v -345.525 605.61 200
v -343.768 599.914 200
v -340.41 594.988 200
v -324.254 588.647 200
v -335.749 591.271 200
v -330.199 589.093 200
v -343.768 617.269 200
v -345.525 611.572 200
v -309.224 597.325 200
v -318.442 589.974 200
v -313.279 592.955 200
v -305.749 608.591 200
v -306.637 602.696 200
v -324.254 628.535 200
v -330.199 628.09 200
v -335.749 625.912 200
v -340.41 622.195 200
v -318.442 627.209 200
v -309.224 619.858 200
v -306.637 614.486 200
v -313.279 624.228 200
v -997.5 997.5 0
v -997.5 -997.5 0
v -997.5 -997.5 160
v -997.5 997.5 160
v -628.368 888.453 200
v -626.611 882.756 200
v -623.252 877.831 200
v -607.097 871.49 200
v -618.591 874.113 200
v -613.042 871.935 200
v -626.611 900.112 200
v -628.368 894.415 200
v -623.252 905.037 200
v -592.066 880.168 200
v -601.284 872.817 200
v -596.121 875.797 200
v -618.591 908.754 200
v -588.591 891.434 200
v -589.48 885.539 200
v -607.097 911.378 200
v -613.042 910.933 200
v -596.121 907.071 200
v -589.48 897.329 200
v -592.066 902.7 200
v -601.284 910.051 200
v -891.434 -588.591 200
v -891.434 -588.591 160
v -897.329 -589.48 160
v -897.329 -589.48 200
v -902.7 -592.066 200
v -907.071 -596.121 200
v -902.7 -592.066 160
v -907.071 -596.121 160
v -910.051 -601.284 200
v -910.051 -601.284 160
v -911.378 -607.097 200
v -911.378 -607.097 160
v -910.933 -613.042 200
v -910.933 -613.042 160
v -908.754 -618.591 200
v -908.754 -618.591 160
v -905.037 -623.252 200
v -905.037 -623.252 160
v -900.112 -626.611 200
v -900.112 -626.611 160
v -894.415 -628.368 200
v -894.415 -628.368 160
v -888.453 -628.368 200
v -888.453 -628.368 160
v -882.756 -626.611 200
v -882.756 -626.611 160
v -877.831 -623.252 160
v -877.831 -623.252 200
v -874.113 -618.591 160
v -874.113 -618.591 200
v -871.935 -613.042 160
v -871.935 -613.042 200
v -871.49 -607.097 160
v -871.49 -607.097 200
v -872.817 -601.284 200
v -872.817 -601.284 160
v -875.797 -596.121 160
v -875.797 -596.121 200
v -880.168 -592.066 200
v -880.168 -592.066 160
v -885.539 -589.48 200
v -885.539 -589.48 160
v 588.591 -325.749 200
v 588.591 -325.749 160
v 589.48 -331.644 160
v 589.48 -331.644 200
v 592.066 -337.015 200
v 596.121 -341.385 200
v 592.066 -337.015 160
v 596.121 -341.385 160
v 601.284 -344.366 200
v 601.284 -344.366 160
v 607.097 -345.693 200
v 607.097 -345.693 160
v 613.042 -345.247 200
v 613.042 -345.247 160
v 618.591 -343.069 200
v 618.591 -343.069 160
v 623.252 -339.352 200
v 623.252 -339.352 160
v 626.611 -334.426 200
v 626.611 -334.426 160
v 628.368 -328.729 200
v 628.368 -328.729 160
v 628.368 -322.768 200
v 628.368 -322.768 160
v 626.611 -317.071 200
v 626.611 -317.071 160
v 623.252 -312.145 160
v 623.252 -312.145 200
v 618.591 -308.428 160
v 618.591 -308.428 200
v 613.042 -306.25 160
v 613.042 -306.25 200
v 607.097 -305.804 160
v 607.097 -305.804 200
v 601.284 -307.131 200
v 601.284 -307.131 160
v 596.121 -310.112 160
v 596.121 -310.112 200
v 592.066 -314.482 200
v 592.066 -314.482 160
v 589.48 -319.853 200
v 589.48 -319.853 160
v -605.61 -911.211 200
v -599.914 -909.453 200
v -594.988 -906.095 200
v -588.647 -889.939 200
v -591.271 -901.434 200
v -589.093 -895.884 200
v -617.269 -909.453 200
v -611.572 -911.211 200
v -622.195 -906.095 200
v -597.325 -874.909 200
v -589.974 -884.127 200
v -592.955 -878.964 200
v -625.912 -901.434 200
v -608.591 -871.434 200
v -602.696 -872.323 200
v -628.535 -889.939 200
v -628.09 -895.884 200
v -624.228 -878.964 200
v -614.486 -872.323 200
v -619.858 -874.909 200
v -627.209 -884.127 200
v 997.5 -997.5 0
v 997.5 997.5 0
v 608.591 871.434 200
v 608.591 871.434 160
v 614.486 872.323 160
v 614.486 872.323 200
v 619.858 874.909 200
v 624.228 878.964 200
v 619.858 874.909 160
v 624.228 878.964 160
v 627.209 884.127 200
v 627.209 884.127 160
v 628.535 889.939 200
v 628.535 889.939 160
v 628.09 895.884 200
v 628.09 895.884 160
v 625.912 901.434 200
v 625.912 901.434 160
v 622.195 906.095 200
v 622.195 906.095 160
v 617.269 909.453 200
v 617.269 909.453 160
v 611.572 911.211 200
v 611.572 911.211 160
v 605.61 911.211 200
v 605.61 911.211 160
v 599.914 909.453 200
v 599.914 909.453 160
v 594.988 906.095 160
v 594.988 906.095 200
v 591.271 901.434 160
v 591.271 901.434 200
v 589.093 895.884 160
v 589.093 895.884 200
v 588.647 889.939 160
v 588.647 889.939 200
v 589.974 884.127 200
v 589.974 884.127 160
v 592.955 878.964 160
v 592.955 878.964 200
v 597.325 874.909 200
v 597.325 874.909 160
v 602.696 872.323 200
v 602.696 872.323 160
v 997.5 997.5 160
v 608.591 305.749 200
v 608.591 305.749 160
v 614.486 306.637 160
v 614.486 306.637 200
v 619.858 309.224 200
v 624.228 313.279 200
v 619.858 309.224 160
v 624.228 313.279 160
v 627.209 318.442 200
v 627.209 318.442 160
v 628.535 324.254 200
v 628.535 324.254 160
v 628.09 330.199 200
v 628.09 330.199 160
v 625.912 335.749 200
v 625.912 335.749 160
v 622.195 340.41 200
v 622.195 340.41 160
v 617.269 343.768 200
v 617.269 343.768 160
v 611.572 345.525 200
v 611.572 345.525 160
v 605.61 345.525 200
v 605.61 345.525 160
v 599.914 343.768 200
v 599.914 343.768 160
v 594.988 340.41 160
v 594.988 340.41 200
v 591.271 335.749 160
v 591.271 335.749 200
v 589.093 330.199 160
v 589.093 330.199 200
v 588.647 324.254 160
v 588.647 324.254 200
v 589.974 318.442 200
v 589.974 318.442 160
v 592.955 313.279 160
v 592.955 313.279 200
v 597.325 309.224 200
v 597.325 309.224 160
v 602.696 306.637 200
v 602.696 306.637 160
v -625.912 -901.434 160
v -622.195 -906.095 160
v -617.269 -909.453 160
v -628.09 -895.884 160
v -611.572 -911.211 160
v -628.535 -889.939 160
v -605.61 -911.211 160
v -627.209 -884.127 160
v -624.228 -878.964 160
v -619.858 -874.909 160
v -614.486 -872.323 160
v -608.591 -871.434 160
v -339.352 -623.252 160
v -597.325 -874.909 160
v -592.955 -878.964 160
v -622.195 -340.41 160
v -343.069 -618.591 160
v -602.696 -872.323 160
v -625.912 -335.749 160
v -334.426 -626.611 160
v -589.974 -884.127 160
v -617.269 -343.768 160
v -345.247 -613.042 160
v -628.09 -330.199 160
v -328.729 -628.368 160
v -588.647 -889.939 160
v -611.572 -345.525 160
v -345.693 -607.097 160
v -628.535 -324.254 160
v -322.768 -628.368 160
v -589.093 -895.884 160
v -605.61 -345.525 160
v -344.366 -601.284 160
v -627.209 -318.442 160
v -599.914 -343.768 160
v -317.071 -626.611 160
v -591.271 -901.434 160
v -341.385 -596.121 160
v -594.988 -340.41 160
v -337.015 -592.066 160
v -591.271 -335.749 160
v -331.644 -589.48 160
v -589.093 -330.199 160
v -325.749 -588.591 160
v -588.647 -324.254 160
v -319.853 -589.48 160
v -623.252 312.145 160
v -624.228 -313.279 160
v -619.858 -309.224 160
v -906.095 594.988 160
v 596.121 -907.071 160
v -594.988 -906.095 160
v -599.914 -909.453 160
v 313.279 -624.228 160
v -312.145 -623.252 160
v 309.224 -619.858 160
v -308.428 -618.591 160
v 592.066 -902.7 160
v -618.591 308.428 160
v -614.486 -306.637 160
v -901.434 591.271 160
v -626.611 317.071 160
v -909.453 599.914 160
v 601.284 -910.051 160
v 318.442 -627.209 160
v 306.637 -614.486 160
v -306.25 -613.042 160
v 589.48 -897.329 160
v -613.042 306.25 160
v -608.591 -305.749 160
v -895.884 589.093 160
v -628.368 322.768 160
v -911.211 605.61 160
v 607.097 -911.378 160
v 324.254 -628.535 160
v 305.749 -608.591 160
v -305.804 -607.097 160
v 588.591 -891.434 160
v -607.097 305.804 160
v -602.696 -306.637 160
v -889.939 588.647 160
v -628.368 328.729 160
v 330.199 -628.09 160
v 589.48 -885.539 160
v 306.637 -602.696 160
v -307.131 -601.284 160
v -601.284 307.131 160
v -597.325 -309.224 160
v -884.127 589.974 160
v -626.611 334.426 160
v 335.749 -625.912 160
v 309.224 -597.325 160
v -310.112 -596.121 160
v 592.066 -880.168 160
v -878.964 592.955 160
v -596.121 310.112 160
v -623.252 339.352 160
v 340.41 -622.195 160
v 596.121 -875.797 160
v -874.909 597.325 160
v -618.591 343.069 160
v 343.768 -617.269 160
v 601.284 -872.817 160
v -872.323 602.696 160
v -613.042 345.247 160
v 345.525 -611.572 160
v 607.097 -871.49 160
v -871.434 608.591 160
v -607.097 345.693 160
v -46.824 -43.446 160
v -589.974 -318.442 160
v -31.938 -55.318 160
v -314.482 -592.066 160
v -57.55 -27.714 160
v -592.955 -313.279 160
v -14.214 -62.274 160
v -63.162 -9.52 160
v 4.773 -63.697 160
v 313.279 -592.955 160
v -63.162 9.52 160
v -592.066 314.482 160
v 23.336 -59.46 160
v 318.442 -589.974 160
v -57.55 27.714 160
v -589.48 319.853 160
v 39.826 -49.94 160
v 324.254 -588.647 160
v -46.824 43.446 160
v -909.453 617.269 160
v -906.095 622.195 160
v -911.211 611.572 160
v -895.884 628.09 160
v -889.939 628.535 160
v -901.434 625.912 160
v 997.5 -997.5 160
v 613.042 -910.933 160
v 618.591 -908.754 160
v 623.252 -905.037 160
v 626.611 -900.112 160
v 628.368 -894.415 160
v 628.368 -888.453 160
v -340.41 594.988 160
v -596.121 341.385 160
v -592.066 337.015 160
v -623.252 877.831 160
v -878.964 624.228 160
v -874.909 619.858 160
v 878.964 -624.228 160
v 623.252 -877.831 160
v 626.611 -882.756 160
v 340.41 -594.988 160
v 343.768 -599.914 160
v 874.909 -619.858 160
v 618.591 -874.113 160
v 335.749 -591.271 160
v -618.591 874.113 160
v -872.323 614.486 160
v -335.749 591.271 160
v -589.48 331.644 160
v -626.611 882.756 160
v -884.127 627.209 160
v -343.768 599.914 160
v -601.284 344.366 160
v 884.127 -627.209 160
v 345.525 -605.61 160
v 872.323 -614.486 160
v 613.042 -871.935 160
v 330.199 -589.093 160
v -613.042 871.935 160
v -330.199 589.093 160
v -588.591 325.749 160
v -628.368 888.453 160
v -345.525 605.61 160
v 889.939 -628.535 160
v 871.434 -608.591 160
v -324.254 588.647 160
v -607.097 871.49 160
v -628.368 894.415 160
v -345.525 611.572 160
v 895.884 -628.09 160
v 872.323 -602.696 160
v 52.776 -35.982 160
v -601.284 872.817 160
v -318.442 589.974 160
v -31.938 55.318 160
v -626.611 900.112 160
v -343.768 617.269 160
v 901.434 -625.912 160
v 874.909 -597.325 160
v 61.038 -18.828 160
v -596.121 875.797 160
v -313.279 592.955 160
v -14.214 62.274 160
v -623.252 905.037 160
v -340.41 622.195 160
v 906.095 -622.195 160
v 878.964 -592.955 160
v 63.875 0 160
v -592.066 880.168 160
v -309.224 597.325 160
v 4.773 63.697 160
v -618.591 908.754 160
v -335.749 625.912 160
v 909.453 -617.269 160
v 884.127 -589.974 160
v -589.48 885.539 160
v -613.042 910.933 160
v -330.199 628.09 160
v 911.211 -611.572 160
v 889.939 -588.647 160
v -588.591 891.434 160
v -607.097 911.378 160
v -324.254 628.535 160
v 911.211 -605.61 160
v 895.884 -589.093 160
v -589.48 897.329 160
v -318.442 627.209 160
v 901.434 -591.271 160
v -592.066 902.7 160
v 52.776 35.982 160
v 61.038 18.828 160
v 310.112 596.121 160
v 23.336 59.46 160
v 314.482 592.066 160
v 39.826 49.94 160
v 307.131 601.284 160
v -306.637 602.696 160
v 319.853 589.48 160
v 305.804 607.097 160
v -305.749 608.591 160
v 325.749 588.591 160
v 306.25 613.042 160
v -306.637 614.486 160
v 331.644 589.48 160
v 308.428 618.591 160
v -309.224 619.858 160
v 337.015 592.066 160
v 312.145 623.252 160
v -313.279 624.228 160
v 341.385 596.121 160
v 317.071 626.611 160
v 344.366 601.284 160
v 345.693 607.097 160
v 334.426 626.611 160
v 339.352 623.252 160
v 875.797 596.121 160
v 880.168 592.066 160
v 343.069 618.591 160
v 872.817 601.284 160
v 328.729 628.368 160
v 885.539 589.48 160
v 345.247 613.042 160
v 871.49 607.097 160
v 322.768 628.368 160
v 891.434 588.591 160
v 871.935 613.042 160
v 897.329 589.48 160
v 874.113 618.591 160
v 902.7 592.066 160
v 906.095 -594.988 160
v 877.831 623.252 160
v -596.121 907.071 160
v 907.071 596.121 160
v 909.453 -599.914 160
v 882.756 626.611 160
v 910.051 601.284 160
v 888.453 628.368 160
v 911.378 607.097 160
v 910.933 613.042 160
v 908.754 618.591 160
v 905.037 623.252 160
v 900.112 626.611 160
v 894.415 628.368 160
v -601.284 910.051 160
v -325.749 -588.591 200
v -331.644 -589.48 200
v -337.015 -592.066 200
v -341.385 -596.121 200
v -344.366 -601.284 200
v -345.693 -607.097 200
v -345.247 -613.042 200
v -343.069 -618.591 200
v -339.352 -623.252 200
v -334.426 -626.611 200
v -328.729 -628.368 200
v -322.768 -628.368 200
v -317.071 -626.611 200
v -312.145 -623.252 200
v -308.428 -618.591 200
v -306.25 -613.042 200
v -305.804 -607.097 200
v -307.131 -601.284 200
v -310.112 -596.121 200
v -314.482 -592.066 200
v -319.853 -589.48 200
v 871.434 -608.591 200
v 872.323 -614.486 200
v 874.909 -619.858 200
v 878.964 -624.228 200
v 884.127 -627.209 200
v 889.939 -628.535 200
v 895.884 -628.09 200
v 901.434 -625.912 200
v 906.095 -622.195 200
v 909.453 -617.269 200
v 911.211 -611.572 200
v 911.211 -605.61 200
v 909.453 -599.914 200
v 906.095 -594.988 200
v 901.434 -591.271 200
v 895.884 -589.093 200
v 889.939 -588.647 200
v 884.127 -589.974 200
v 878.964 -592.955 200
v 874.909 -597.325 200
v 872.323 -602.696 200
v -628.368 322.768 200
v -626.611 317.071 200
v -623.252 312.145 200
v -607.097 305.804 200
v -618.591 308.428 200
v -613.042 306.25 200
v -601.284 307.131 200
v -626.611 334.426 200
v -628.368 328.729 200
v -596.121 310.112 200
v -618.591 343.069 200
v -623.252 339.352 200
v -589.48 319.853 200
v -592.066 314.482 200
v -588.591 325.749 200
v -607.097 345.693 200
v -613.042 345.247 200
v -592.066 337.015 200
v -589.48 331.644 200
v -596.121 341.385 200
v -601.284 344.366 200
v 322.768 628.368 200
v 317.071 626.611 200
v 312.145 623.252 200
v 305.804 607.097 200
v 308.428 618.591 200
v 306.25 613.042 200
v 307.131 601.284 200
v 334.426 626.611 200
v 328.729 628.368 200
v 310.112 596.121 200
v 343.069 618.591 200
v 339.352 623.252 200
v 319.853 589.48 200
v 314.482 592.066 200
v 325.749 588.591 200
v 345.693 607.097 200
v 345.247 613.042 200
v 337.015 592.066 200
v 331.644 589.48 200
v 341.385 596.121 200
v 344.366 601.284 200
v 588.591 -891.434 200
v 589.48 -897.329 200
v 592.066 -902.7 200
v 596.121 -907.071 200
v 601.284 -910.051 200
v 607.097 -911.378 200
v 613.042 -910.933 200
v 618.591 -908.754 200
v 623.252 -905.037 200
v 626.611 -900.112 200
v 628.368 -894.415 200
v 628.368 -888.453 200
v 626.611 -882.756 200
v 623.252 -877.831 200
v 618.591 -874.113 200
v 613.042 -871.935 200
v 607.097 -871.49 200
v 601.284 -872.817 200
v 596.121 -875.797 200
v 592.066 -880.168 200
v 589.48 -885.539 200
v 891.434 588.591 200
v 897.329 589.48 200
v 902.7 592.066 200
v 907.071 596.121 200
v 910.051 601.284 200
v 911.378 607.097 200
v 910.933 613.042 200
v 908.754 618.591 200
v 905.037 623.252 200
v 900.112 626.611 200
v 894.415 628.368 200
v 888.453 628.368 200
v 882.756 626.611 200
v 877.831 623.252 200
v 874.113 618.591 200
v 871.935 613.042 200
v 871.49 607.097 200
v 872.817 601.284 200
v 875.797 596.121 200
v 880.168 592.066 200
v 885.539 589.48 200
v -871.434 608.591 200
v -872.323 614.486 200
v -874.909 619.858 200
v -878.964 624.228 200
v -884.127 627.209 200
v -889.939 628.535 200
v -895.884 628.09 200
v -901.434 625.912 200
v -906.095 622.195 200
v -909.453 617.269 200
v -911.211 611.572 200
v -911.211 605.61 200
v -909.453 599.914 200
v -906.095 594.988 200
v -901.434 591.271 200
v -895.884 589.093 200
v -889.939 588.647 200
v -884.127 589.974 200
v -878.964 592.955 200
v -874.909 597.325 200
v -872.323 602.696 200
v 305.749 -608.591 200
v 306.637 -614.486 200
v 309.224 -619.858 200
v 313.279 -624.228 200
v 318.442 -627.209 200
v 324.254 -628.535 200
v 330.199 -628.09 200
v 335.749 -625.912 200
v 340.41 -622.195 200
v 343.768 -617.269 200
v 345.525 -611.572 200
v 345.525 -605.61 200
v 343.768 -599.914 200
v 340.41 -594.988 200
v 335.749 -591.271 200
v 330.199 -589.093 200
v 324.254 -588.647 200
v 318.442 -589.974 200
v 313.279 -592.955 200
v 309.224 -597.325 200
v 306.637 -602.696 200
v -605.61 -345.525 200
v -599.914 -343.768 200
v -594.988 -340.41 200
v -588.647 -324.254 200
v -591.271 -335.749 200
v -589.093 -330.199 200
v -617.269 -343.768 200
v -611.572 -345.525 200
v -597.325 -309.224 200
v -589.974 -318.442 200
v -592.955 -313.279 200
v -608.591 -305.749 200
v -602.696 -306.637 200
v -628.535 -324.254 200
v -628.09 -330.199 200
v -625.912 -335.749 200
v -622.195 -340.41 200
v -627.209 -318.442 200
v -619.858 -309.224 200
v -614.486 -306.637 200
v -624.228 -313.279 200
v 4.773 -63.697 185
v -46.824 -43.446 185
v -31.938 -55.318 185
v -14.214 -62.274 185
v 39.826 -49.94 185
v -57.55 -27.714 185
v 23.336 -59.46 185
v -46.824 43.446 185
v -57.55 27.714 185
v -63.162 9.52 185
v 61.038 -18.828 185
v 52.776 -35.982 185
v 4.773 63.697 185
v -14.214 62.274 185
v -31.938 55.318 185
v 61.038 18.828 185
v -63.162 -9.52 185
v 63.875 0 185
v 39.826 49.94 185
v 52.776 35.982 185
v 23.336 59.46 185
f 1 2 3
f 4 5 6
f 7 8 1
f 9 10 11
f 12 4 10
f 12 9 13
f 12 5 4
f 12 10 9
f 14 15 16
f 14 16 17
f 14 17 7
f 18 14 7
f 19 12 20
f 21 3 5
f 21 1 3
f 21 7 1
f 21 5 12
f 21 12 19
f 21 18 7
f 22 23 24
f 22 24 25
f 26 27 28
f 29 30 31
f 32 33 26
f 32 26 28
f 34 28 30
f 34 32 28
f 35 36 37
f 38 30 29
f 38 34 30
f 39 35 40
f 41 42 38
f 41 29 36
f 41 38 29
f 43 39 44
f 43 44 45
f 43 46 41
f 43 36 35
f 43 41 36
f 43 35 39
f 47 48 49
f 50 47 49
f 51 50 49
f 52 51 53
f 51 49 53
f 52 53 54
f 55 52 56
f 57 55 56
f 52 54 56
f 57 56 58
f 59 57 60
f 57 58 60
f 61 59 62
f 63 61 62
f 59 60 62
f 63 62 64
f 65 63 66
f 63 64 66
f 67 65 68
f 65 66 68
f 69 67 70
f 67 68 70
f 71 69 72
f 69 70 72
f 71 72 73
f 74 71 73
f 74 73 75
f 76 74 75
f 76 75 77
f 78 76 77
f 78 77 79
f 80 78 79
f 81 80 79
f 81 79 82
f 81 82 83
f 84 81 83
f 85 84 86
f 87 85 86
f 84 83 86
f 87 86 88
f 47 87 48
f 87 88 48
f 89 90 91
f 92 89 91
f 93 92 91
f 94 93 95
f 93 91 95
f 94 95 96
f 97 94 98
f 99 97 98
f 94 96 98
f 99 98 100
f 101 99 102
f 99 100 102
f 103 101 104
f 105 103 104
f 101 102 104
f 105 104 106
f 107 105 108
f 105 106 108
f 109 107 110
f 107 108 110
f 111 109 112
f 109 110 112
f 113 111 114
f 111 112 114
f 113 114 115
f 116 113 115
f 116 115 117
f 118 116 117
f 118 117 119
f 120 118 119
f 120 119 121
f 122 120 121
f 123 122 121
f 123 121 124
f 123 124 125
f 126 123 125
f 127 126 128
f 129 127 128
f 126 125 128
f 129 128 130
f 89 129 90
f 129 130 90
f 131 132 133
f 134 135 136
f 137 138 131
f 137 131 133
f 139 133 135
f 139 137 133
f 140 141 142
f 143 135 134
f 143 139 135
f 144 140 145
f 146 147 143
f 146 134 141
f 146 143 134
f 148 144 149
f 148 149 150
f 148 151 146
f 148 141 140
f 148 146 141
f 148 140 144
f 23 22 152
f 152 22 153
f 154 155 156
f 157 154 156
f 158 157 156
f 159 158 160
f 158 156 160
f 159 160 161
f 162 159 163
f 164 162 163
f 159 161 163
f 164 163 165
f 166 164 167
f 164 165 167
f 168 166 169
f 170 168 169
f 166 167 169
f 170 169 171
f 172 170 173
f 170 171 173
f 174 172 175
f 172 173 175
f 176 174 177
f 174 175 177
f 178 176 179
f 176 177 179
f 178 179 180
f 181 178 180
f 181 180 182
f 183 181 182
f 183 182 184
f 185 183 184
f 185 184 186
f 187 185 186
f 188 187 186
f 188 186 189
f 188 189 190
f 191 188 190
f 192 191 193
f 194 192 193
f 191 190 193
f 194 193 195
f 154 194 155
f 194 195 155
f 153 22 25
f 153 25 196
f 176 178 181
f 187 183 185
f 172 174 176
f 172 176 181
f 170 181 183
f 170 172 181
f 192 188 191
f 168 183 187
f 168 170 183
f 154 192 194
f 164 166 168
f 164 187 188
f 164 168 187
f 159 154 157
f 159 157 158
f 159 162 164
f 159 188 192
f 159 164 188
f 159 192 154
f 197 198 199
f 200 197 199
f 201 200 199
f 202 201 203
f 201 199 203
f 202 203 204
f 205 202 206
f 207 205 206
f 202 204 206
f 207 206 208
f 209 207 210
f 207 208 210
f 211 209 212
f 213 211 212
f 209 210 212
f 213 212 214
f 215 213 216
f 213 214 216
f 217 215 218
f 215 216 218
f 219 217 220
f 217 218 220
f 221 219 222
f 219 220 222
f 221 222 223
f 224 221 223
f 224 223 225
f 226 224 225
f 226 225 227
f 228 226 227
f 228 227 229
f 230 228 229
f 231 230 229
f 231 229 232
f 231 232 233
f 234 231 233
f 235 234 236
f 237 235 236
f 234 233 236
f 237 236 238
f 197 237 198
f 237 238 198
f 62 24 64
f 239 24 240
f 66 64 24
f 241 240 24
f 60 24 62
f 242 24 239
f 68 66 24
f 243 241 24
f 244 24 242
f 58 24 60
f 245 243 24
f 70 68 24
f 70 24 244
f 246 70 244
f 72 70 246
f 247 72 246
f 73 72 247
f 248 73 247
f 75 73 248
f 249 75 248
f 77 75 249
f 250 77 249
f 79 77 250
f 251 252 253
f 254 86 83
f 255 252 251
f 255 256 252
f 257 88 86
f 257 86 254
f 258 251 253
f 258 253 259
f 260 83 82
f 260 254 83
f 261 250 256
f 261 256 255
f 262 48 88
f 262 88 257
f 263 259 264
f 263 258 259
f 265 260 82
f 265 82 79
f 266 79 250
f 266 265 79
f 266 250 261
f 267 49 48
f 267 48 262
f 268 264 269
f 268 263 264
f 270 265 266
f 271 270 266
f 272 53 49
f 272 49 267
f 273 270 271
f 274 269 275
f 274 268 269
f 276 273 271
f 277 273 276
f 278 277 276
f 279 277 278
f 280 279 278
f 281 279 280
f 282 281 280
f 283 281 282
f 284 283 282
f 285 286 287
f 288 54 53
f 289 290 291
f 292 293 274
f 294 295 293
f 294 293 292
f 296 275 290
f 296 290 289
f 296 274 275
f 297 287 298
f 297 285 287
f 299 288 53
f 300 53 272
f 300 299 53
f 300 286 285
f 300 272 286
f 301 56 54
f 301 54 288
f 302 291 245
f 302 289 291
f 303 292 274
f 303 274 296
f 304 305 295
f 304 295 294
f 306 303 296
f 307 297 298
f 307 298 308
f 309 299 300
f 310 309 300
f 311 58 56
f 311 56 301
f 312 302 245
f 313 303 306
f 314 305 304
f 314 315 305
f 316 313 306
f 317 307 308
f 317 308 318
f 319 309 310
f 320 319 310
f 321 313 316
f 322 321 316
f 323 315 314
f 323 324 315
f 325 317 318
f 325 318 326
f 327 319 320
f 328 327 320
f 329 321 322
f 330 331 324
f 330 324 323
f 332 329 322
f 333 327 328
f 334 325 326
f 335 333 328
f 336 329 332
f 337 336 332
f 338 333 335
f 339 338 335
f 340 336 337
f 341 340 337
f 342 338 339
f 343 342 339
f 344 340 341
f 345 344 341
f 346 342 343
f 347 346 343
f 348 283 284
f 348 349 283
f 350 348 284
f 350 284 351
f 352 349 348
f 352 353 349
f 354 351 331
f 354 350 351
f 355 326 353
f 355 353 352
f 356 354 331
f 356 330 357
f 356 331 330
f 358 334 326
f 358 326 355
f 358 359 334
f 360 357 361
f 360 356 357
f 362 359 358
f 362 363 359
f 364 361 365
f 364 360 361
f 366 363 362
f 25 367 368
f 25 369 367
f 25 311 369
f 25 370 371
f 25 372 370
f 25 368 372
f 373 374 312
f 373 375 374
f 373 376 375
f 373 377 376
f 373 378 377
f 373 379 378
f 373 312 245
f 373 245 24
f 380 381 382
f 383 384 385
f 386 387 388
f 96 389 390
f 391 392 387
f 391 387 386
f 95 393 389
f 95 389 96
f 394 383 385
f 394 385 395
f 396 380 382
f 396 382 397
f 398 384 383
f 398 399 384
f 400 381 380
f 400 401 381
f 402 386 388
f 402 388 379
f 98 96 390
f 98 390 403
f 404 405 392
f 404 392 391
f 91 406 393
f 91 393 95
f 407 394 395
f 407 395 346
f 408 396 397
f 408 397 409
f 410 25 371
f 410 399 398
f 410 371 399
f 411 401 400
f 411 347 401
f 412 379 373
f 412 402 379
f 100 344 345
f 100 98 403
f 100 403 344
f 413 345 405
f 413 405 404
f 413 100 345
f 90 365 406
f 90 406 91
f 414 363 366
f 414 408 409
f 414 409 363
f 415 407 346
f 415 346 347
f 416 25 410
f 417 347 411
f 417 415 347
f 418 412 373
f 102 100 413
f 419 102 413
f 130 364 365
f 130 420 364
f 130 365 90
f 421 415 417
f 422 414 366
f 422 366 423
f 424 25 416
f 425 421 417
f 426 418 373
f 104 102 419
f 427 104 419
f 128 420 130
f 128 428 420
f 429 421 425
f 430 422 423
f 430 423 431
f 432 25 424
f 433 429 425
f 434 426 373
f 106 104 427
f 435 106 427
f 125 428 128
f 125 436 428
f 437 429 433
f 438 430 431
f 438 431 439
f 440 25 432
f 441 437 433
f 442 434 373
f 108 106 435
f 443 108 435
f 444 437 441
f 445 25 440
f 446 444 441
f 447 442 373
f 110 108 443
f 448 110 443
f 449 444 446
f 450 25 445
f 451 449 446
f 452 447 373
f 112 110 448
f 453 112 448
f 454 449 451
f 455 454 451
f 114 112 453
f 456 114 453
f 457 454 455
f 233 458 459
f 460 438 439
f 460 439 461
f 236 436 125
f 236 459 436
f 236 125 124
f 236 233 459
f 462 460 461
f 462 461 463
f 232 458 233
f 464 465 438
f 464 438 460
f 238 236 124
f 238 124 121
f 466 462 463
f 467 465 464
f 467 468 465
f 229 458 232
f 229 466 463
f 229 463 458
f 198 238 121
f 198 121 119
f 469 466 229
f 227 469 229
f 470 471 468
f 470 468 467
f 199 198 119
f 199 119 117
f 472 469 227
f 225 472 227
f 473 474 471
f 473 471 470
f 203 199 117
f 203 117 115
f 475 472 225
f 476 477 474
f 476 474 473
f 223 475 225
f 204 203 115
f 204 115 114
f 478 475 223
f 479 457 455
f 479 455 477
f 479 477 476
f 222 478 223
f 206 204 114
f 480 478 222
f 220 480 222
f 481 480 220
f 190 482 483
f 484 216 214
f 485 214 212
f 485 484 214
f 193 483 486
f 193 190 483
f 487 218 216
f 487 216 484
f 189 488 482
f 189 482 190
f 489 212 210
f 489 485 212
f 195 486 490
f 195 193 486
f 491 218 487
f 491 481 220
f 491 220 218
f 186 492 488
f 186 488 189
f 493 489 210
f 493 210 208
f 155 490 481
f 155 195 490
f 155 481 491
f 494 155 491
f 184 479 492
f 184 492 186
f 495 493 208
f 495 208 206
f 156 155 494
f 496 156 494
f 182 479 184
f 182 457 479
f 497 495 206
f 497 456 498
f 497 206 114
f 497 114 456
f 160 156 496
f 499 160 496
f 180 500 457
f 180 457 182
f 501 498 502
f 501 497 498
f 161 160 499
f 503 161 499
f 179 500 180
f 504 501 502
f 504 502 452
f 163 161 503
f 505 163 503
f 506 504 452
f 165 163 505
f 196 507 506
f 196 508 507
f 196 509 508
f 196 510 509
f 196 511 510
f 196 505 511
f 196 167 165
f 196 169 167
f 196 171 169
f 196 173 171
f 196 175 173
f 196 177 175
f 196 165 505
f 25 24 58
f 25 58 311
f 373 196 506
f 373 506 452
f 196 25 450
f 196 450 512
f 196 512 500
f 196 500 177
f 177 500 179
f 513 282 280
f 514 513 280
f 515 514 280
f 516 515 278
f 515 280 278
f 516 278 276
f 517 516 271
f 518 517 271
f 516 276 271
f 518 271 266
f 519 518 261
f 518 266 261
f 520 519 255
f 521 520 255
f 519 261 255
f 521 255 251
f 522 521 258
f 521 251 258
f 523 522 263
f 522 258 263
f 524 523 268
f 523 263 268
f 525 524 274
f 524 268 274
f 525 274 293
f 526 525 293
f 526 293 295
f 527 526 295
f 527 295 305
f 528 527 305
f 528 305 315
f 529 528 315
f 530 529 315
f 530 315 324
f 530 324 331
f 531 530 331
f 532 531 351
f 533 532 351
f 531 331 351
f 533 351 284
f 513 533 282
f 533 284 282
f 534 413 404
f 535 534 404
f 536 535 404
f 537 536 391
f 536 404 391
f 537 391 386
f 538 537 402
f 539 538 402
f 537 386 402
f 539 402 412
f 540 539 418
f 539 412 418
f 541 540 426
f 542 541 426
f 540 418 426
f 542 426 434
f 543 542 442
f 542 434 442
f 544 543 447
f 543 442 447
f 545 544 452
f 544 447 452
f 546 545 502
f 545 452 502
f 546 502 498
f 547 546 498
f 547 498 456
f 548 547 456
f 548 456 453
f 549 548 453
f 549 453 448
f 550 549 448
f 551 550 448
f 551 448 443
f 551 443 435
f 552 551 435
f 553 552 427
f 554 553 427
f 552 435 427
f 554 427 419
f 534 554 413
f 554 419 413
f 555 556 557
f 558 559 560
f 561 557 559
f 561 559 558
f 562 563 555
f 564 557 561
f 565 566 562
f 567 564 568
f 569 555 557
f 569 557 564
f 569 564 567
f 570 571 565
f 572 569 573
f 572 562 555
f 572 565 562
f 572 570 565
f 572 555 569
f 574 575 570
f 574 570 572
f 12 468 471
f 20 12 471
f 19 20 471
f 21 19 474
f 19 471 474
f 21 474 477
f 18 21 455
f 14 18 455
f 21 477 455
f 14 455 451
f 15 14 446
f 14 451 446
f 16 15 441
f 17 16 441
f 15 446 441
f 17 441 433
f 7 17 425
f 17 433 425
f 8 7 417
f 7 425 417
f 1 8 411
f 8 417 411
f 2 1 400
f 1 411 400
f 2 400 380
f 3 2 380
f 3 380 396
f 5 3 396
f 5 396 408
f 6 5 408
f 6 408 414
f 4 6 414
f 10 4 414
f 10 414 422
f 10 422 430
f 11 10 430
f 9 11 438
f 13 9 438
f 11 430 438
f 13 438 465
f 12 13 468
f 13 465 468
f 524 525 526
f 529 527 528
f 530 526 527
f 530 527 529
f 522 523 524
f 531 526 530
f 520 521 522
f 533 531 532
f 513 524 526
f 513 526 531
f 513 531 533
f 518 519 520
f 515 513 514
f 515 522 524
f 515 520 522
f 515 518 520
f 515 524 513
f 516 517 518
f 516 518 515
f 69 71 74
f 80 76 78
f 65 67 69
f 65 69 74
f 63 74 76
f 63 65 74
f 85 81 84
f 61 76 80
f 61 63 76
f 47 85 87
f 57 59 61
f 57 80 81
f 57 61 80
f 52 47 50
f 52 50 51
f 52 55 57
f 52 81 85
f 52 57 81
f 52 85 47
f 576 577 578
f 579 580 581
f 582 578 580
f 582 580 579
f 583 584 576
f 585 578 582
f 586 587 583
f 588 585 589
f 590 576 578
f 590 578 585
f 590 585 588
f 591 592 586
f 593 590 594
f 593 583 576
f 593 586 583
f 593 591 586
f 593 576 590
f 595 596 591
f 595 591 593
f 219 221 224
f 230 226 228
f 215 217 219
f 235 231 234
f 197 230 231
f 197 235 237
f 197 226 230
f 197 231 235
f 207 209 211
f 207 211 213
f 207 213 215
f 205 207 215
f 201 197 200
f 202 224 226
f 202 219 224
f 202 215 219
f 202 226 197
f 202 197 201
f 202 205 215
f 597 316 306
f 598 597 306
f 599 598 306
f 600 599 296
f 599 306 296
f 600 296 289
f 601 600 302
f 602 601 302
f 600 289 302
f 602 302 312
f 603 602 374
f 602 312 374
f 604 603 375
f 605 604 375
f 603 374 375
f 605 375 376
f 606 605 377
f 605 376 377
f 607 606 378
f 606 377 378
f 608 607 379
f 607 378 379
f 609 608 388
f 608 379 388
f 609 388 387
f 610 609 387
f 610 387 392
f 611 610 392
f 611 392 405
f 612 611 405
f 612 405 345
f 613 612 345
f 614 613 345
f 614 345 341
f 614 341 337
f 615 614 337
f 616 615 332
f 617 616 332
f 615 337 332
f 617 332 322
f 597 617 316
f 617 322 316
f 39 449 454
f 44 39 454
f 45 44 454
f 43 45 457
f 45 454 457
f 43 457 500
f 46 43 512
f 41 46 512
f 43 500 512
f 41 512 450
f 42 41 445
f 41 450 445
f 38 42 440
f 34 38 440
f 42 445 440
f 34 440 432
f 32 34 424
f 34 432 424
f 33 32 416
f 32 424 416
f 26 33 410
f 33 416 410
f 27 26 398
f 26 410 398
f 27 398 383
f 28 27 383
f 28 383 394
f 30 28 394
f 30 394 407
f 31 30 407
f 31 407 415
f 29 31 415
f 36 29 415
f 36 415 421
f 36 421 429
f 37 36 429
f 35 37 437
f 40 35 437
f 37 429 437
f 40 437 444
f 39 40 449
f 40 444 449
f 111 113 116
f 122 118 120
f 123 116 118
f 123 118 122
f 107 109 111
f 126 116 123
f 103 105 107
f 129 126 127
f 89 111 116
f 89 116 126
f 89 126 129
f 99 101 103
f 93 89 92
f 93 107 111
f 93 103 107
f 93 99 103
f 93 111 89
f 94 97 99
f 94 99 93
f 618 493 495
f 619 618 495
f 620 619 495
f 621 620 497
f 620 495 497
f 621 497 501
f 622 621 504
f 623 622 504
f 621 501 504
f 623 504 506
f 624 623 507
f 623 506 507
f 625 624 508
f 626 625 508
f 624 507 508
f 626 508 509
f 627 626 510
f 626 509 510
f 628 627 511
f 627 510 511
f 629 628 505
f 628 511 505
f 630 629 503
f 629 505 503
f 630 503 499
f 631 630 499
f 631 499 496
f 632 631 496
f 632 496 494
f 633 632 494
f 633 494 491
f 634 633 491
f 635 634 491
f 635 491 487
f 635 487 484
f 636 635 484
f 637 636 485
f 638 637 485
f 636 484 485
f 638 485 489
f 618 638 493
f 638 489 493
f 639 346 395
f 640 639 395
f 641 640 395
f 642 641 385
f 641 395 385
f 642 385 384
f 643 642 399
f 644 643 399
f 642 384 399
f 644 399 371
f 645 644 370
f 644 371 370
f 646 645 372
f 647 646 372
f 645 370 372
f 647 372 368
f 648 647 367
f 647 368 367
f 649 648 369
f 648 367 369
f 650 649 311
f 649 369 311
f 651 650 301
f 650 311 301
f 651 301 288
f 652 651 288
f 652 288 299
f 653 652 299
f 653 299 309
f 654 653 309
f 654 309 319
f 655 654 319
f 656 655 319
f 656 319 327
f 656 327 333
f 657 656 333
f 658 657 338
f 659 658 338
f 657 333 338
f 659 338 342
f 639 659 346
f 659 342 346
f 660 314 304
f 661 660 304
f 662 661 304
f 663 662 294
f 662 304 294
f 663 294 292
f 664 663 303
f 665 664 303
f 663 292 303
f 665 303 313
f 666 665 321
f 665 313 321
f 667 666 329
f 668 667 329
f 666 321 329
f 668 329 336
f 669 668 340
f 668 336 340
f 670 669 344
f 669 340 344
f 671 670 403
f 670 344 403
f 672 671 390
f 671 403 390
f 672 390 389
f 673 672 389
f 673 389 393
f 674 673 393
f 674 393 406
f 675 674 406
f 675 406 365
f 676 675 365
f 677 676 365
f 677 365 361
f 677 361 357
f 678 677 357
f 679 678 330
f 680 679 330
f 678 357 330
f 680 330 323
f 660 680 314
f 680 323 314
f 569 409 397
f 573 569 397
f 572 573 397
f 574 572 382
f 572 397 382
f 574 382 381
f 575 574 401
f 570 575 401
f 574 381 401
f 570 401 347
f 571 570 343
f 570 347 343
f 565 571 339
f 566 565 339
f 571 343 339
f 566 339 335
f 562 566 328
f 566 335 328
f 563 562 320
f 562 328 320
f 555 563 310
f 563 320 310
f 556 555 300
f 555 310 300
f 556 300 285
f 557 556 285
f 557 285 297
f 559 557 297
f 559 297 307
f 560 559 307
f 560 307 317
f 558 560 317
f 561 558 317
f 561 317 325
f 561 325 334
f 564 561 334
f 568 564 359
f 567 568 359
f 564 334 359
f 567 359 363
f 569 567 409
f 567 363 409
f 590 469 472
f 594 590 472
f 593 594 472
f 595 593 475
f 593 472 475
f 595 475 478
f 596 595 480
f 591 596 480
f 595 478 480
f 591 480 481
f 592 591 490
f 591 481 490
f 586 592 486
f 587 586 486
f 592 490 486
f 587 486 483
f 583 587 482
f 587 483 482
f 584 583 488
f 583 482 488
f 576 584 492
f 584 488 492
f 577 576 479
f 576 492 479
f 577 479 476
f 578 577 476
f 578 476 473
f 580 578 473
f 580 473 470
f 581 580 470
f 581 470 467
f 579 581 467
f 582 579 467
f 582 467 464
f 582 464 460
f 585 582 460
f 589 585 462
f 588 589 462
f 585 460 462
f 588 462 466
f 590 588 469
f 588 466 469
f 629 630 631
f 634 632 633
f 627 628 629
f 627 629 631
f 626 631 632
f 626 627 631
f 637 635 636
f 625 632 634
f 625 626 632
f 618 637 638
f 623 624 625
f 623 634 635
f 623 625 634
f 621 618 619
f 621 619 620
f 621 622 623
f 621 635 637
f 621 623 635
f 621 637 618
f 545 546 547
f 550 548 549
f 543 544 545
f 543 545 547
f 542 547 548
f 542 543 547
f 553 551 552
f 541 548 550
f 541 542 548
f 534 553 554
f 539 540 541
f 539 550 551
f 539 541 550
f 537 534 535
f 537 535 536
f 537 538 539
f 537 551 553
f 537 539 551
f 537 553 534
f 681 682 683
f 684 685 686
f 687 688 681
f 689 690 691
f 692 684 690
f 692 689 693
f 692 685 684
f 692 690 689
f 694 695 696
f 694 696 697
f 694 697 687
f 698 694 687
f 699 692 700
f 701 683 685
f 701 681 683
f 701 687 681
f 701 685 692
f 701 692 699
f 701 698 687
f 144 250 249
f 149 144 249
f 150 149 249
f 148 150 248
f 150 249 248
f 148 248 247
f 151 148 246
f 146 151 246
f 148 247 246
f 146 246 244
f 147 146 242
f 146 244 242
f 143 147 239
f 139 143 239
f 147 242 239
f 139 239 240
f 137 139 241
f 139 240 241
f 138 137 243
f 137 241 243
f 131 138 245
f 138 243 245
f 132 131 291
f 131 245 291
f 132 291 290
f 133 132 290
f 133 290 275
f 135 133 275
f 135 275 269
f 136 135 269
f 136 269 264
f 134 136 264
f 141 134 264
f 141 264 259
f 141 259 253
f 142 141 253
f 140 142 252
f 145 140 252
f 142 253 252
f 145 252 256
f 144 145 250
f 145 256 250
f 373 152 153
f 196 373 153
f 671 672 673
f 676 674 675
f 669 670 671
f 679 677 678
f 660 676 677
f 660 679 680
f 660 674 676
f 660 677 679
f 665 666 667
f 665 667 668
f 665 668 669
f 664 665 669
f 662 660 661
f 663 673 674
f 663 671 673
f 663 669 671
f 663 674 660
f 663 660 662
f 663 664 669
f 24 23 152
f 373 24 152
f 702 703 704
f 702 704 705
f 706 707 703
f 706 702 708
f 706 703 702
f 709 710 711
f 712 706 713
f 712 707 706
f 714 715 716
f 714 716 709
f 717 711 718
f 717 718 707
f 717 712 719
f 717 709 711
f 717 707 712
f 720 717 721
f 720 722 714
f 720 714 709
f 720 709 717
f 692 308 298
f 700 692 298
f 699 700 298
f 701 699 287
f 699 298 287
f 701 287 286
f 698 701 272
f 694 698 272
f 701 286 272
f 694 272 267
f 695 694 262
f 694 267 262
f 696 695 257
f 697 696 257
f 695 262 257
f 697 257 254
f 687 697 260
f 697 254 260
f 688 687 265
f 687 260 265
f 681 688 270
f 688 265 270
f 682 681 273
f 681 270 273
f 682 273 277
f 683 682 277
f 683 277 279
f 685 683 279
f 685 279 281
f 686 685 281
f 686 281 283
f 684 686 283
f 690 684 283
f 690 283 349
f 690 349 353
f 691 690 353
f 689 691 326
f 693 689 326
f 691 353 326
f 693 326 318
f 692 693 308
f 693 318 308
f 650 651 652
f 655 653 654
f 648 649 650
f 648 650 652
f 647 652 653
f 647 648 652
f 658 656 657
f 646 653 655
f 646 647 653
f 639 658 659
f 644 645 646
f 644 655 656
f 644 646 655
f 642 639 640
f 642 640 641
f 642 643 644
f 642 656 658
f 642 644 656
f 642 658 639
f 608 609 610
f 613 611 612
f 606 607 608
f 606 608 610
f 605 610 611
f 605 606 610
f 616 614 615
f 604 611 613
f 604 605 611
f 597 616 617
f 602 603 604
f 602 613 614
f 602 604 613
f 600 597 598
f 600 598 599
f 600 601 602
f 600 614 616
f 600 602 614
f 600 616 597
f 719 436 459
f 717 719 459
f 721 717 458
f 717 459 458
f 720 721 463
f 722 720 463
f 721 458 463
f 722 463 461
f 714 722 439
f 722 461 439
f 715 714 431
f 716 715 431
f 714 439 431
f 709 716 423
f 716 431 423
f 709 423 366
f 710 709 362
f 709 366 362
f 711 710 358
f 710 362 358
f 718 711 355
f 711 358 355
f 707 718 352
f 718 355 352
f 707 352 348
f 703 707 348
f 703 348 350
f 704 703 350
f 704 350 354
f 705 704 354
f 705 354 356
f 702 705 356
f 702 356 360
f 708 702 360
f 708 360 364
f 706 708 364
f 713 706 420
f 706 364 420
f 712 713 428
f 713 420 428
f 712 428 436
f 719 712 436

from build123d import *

# Parameters (mm, degrees)
F0_W            = 1995
F0_H            = 1995
F1_DEPTH        = 160
F2_R            = 20
F3_DEPTH        = 40
F3_COPIES_COUNT = 4
F4_R            = 63.875346373
F5_DEPTH        = 25


# Not quite as in the source:
# - a pattern or mirror of a feature is missing from the dataset's text; its kind, count and spacing are read off the source's solid


with BuildPart() as f1:
    # F0 (on Top) → F1 (new body)
    with BuildSketch(Plane.XY):
        Rectangle(F0_W, F0_H)
    extrude(amount=F1_DEPTH)

    # F2 (on face) → F3 (join)
    with BuildSketch(Plane.XY.offset(160)):
        with Locations((-608.5912703474, 891.433982822)):
            Circle(F2_R)
        with Locations((-325.7485578728, 608.5912703474)):
            Circle(F2_R)
        with Locations((-608.5912703474, 325.7485578728)):
            Circle(F2_R)
        with Locations((-891.433982822, 608.5912703474)):
            Circle(F2_R)
    f3 = extrude(amount=F3_DEPTH)

    # F3_copies: F3 ×4 about axis
    f3_copies_axis = Axis((0, 0, 0), (0, 0, 1))
    for i in range(1, F3_COPIES_COUNT):
        add(f3.rotate(f3_copies_axis, i * 360 / F3_COPIES_COUNT))

    # F4 (on face) → F5 (join)
    with BuildSketch(Plane.XY.offset(160)):
        Circle(F4_R)
    extrude(amount=F5_DEPTH)


solid = f1.part
